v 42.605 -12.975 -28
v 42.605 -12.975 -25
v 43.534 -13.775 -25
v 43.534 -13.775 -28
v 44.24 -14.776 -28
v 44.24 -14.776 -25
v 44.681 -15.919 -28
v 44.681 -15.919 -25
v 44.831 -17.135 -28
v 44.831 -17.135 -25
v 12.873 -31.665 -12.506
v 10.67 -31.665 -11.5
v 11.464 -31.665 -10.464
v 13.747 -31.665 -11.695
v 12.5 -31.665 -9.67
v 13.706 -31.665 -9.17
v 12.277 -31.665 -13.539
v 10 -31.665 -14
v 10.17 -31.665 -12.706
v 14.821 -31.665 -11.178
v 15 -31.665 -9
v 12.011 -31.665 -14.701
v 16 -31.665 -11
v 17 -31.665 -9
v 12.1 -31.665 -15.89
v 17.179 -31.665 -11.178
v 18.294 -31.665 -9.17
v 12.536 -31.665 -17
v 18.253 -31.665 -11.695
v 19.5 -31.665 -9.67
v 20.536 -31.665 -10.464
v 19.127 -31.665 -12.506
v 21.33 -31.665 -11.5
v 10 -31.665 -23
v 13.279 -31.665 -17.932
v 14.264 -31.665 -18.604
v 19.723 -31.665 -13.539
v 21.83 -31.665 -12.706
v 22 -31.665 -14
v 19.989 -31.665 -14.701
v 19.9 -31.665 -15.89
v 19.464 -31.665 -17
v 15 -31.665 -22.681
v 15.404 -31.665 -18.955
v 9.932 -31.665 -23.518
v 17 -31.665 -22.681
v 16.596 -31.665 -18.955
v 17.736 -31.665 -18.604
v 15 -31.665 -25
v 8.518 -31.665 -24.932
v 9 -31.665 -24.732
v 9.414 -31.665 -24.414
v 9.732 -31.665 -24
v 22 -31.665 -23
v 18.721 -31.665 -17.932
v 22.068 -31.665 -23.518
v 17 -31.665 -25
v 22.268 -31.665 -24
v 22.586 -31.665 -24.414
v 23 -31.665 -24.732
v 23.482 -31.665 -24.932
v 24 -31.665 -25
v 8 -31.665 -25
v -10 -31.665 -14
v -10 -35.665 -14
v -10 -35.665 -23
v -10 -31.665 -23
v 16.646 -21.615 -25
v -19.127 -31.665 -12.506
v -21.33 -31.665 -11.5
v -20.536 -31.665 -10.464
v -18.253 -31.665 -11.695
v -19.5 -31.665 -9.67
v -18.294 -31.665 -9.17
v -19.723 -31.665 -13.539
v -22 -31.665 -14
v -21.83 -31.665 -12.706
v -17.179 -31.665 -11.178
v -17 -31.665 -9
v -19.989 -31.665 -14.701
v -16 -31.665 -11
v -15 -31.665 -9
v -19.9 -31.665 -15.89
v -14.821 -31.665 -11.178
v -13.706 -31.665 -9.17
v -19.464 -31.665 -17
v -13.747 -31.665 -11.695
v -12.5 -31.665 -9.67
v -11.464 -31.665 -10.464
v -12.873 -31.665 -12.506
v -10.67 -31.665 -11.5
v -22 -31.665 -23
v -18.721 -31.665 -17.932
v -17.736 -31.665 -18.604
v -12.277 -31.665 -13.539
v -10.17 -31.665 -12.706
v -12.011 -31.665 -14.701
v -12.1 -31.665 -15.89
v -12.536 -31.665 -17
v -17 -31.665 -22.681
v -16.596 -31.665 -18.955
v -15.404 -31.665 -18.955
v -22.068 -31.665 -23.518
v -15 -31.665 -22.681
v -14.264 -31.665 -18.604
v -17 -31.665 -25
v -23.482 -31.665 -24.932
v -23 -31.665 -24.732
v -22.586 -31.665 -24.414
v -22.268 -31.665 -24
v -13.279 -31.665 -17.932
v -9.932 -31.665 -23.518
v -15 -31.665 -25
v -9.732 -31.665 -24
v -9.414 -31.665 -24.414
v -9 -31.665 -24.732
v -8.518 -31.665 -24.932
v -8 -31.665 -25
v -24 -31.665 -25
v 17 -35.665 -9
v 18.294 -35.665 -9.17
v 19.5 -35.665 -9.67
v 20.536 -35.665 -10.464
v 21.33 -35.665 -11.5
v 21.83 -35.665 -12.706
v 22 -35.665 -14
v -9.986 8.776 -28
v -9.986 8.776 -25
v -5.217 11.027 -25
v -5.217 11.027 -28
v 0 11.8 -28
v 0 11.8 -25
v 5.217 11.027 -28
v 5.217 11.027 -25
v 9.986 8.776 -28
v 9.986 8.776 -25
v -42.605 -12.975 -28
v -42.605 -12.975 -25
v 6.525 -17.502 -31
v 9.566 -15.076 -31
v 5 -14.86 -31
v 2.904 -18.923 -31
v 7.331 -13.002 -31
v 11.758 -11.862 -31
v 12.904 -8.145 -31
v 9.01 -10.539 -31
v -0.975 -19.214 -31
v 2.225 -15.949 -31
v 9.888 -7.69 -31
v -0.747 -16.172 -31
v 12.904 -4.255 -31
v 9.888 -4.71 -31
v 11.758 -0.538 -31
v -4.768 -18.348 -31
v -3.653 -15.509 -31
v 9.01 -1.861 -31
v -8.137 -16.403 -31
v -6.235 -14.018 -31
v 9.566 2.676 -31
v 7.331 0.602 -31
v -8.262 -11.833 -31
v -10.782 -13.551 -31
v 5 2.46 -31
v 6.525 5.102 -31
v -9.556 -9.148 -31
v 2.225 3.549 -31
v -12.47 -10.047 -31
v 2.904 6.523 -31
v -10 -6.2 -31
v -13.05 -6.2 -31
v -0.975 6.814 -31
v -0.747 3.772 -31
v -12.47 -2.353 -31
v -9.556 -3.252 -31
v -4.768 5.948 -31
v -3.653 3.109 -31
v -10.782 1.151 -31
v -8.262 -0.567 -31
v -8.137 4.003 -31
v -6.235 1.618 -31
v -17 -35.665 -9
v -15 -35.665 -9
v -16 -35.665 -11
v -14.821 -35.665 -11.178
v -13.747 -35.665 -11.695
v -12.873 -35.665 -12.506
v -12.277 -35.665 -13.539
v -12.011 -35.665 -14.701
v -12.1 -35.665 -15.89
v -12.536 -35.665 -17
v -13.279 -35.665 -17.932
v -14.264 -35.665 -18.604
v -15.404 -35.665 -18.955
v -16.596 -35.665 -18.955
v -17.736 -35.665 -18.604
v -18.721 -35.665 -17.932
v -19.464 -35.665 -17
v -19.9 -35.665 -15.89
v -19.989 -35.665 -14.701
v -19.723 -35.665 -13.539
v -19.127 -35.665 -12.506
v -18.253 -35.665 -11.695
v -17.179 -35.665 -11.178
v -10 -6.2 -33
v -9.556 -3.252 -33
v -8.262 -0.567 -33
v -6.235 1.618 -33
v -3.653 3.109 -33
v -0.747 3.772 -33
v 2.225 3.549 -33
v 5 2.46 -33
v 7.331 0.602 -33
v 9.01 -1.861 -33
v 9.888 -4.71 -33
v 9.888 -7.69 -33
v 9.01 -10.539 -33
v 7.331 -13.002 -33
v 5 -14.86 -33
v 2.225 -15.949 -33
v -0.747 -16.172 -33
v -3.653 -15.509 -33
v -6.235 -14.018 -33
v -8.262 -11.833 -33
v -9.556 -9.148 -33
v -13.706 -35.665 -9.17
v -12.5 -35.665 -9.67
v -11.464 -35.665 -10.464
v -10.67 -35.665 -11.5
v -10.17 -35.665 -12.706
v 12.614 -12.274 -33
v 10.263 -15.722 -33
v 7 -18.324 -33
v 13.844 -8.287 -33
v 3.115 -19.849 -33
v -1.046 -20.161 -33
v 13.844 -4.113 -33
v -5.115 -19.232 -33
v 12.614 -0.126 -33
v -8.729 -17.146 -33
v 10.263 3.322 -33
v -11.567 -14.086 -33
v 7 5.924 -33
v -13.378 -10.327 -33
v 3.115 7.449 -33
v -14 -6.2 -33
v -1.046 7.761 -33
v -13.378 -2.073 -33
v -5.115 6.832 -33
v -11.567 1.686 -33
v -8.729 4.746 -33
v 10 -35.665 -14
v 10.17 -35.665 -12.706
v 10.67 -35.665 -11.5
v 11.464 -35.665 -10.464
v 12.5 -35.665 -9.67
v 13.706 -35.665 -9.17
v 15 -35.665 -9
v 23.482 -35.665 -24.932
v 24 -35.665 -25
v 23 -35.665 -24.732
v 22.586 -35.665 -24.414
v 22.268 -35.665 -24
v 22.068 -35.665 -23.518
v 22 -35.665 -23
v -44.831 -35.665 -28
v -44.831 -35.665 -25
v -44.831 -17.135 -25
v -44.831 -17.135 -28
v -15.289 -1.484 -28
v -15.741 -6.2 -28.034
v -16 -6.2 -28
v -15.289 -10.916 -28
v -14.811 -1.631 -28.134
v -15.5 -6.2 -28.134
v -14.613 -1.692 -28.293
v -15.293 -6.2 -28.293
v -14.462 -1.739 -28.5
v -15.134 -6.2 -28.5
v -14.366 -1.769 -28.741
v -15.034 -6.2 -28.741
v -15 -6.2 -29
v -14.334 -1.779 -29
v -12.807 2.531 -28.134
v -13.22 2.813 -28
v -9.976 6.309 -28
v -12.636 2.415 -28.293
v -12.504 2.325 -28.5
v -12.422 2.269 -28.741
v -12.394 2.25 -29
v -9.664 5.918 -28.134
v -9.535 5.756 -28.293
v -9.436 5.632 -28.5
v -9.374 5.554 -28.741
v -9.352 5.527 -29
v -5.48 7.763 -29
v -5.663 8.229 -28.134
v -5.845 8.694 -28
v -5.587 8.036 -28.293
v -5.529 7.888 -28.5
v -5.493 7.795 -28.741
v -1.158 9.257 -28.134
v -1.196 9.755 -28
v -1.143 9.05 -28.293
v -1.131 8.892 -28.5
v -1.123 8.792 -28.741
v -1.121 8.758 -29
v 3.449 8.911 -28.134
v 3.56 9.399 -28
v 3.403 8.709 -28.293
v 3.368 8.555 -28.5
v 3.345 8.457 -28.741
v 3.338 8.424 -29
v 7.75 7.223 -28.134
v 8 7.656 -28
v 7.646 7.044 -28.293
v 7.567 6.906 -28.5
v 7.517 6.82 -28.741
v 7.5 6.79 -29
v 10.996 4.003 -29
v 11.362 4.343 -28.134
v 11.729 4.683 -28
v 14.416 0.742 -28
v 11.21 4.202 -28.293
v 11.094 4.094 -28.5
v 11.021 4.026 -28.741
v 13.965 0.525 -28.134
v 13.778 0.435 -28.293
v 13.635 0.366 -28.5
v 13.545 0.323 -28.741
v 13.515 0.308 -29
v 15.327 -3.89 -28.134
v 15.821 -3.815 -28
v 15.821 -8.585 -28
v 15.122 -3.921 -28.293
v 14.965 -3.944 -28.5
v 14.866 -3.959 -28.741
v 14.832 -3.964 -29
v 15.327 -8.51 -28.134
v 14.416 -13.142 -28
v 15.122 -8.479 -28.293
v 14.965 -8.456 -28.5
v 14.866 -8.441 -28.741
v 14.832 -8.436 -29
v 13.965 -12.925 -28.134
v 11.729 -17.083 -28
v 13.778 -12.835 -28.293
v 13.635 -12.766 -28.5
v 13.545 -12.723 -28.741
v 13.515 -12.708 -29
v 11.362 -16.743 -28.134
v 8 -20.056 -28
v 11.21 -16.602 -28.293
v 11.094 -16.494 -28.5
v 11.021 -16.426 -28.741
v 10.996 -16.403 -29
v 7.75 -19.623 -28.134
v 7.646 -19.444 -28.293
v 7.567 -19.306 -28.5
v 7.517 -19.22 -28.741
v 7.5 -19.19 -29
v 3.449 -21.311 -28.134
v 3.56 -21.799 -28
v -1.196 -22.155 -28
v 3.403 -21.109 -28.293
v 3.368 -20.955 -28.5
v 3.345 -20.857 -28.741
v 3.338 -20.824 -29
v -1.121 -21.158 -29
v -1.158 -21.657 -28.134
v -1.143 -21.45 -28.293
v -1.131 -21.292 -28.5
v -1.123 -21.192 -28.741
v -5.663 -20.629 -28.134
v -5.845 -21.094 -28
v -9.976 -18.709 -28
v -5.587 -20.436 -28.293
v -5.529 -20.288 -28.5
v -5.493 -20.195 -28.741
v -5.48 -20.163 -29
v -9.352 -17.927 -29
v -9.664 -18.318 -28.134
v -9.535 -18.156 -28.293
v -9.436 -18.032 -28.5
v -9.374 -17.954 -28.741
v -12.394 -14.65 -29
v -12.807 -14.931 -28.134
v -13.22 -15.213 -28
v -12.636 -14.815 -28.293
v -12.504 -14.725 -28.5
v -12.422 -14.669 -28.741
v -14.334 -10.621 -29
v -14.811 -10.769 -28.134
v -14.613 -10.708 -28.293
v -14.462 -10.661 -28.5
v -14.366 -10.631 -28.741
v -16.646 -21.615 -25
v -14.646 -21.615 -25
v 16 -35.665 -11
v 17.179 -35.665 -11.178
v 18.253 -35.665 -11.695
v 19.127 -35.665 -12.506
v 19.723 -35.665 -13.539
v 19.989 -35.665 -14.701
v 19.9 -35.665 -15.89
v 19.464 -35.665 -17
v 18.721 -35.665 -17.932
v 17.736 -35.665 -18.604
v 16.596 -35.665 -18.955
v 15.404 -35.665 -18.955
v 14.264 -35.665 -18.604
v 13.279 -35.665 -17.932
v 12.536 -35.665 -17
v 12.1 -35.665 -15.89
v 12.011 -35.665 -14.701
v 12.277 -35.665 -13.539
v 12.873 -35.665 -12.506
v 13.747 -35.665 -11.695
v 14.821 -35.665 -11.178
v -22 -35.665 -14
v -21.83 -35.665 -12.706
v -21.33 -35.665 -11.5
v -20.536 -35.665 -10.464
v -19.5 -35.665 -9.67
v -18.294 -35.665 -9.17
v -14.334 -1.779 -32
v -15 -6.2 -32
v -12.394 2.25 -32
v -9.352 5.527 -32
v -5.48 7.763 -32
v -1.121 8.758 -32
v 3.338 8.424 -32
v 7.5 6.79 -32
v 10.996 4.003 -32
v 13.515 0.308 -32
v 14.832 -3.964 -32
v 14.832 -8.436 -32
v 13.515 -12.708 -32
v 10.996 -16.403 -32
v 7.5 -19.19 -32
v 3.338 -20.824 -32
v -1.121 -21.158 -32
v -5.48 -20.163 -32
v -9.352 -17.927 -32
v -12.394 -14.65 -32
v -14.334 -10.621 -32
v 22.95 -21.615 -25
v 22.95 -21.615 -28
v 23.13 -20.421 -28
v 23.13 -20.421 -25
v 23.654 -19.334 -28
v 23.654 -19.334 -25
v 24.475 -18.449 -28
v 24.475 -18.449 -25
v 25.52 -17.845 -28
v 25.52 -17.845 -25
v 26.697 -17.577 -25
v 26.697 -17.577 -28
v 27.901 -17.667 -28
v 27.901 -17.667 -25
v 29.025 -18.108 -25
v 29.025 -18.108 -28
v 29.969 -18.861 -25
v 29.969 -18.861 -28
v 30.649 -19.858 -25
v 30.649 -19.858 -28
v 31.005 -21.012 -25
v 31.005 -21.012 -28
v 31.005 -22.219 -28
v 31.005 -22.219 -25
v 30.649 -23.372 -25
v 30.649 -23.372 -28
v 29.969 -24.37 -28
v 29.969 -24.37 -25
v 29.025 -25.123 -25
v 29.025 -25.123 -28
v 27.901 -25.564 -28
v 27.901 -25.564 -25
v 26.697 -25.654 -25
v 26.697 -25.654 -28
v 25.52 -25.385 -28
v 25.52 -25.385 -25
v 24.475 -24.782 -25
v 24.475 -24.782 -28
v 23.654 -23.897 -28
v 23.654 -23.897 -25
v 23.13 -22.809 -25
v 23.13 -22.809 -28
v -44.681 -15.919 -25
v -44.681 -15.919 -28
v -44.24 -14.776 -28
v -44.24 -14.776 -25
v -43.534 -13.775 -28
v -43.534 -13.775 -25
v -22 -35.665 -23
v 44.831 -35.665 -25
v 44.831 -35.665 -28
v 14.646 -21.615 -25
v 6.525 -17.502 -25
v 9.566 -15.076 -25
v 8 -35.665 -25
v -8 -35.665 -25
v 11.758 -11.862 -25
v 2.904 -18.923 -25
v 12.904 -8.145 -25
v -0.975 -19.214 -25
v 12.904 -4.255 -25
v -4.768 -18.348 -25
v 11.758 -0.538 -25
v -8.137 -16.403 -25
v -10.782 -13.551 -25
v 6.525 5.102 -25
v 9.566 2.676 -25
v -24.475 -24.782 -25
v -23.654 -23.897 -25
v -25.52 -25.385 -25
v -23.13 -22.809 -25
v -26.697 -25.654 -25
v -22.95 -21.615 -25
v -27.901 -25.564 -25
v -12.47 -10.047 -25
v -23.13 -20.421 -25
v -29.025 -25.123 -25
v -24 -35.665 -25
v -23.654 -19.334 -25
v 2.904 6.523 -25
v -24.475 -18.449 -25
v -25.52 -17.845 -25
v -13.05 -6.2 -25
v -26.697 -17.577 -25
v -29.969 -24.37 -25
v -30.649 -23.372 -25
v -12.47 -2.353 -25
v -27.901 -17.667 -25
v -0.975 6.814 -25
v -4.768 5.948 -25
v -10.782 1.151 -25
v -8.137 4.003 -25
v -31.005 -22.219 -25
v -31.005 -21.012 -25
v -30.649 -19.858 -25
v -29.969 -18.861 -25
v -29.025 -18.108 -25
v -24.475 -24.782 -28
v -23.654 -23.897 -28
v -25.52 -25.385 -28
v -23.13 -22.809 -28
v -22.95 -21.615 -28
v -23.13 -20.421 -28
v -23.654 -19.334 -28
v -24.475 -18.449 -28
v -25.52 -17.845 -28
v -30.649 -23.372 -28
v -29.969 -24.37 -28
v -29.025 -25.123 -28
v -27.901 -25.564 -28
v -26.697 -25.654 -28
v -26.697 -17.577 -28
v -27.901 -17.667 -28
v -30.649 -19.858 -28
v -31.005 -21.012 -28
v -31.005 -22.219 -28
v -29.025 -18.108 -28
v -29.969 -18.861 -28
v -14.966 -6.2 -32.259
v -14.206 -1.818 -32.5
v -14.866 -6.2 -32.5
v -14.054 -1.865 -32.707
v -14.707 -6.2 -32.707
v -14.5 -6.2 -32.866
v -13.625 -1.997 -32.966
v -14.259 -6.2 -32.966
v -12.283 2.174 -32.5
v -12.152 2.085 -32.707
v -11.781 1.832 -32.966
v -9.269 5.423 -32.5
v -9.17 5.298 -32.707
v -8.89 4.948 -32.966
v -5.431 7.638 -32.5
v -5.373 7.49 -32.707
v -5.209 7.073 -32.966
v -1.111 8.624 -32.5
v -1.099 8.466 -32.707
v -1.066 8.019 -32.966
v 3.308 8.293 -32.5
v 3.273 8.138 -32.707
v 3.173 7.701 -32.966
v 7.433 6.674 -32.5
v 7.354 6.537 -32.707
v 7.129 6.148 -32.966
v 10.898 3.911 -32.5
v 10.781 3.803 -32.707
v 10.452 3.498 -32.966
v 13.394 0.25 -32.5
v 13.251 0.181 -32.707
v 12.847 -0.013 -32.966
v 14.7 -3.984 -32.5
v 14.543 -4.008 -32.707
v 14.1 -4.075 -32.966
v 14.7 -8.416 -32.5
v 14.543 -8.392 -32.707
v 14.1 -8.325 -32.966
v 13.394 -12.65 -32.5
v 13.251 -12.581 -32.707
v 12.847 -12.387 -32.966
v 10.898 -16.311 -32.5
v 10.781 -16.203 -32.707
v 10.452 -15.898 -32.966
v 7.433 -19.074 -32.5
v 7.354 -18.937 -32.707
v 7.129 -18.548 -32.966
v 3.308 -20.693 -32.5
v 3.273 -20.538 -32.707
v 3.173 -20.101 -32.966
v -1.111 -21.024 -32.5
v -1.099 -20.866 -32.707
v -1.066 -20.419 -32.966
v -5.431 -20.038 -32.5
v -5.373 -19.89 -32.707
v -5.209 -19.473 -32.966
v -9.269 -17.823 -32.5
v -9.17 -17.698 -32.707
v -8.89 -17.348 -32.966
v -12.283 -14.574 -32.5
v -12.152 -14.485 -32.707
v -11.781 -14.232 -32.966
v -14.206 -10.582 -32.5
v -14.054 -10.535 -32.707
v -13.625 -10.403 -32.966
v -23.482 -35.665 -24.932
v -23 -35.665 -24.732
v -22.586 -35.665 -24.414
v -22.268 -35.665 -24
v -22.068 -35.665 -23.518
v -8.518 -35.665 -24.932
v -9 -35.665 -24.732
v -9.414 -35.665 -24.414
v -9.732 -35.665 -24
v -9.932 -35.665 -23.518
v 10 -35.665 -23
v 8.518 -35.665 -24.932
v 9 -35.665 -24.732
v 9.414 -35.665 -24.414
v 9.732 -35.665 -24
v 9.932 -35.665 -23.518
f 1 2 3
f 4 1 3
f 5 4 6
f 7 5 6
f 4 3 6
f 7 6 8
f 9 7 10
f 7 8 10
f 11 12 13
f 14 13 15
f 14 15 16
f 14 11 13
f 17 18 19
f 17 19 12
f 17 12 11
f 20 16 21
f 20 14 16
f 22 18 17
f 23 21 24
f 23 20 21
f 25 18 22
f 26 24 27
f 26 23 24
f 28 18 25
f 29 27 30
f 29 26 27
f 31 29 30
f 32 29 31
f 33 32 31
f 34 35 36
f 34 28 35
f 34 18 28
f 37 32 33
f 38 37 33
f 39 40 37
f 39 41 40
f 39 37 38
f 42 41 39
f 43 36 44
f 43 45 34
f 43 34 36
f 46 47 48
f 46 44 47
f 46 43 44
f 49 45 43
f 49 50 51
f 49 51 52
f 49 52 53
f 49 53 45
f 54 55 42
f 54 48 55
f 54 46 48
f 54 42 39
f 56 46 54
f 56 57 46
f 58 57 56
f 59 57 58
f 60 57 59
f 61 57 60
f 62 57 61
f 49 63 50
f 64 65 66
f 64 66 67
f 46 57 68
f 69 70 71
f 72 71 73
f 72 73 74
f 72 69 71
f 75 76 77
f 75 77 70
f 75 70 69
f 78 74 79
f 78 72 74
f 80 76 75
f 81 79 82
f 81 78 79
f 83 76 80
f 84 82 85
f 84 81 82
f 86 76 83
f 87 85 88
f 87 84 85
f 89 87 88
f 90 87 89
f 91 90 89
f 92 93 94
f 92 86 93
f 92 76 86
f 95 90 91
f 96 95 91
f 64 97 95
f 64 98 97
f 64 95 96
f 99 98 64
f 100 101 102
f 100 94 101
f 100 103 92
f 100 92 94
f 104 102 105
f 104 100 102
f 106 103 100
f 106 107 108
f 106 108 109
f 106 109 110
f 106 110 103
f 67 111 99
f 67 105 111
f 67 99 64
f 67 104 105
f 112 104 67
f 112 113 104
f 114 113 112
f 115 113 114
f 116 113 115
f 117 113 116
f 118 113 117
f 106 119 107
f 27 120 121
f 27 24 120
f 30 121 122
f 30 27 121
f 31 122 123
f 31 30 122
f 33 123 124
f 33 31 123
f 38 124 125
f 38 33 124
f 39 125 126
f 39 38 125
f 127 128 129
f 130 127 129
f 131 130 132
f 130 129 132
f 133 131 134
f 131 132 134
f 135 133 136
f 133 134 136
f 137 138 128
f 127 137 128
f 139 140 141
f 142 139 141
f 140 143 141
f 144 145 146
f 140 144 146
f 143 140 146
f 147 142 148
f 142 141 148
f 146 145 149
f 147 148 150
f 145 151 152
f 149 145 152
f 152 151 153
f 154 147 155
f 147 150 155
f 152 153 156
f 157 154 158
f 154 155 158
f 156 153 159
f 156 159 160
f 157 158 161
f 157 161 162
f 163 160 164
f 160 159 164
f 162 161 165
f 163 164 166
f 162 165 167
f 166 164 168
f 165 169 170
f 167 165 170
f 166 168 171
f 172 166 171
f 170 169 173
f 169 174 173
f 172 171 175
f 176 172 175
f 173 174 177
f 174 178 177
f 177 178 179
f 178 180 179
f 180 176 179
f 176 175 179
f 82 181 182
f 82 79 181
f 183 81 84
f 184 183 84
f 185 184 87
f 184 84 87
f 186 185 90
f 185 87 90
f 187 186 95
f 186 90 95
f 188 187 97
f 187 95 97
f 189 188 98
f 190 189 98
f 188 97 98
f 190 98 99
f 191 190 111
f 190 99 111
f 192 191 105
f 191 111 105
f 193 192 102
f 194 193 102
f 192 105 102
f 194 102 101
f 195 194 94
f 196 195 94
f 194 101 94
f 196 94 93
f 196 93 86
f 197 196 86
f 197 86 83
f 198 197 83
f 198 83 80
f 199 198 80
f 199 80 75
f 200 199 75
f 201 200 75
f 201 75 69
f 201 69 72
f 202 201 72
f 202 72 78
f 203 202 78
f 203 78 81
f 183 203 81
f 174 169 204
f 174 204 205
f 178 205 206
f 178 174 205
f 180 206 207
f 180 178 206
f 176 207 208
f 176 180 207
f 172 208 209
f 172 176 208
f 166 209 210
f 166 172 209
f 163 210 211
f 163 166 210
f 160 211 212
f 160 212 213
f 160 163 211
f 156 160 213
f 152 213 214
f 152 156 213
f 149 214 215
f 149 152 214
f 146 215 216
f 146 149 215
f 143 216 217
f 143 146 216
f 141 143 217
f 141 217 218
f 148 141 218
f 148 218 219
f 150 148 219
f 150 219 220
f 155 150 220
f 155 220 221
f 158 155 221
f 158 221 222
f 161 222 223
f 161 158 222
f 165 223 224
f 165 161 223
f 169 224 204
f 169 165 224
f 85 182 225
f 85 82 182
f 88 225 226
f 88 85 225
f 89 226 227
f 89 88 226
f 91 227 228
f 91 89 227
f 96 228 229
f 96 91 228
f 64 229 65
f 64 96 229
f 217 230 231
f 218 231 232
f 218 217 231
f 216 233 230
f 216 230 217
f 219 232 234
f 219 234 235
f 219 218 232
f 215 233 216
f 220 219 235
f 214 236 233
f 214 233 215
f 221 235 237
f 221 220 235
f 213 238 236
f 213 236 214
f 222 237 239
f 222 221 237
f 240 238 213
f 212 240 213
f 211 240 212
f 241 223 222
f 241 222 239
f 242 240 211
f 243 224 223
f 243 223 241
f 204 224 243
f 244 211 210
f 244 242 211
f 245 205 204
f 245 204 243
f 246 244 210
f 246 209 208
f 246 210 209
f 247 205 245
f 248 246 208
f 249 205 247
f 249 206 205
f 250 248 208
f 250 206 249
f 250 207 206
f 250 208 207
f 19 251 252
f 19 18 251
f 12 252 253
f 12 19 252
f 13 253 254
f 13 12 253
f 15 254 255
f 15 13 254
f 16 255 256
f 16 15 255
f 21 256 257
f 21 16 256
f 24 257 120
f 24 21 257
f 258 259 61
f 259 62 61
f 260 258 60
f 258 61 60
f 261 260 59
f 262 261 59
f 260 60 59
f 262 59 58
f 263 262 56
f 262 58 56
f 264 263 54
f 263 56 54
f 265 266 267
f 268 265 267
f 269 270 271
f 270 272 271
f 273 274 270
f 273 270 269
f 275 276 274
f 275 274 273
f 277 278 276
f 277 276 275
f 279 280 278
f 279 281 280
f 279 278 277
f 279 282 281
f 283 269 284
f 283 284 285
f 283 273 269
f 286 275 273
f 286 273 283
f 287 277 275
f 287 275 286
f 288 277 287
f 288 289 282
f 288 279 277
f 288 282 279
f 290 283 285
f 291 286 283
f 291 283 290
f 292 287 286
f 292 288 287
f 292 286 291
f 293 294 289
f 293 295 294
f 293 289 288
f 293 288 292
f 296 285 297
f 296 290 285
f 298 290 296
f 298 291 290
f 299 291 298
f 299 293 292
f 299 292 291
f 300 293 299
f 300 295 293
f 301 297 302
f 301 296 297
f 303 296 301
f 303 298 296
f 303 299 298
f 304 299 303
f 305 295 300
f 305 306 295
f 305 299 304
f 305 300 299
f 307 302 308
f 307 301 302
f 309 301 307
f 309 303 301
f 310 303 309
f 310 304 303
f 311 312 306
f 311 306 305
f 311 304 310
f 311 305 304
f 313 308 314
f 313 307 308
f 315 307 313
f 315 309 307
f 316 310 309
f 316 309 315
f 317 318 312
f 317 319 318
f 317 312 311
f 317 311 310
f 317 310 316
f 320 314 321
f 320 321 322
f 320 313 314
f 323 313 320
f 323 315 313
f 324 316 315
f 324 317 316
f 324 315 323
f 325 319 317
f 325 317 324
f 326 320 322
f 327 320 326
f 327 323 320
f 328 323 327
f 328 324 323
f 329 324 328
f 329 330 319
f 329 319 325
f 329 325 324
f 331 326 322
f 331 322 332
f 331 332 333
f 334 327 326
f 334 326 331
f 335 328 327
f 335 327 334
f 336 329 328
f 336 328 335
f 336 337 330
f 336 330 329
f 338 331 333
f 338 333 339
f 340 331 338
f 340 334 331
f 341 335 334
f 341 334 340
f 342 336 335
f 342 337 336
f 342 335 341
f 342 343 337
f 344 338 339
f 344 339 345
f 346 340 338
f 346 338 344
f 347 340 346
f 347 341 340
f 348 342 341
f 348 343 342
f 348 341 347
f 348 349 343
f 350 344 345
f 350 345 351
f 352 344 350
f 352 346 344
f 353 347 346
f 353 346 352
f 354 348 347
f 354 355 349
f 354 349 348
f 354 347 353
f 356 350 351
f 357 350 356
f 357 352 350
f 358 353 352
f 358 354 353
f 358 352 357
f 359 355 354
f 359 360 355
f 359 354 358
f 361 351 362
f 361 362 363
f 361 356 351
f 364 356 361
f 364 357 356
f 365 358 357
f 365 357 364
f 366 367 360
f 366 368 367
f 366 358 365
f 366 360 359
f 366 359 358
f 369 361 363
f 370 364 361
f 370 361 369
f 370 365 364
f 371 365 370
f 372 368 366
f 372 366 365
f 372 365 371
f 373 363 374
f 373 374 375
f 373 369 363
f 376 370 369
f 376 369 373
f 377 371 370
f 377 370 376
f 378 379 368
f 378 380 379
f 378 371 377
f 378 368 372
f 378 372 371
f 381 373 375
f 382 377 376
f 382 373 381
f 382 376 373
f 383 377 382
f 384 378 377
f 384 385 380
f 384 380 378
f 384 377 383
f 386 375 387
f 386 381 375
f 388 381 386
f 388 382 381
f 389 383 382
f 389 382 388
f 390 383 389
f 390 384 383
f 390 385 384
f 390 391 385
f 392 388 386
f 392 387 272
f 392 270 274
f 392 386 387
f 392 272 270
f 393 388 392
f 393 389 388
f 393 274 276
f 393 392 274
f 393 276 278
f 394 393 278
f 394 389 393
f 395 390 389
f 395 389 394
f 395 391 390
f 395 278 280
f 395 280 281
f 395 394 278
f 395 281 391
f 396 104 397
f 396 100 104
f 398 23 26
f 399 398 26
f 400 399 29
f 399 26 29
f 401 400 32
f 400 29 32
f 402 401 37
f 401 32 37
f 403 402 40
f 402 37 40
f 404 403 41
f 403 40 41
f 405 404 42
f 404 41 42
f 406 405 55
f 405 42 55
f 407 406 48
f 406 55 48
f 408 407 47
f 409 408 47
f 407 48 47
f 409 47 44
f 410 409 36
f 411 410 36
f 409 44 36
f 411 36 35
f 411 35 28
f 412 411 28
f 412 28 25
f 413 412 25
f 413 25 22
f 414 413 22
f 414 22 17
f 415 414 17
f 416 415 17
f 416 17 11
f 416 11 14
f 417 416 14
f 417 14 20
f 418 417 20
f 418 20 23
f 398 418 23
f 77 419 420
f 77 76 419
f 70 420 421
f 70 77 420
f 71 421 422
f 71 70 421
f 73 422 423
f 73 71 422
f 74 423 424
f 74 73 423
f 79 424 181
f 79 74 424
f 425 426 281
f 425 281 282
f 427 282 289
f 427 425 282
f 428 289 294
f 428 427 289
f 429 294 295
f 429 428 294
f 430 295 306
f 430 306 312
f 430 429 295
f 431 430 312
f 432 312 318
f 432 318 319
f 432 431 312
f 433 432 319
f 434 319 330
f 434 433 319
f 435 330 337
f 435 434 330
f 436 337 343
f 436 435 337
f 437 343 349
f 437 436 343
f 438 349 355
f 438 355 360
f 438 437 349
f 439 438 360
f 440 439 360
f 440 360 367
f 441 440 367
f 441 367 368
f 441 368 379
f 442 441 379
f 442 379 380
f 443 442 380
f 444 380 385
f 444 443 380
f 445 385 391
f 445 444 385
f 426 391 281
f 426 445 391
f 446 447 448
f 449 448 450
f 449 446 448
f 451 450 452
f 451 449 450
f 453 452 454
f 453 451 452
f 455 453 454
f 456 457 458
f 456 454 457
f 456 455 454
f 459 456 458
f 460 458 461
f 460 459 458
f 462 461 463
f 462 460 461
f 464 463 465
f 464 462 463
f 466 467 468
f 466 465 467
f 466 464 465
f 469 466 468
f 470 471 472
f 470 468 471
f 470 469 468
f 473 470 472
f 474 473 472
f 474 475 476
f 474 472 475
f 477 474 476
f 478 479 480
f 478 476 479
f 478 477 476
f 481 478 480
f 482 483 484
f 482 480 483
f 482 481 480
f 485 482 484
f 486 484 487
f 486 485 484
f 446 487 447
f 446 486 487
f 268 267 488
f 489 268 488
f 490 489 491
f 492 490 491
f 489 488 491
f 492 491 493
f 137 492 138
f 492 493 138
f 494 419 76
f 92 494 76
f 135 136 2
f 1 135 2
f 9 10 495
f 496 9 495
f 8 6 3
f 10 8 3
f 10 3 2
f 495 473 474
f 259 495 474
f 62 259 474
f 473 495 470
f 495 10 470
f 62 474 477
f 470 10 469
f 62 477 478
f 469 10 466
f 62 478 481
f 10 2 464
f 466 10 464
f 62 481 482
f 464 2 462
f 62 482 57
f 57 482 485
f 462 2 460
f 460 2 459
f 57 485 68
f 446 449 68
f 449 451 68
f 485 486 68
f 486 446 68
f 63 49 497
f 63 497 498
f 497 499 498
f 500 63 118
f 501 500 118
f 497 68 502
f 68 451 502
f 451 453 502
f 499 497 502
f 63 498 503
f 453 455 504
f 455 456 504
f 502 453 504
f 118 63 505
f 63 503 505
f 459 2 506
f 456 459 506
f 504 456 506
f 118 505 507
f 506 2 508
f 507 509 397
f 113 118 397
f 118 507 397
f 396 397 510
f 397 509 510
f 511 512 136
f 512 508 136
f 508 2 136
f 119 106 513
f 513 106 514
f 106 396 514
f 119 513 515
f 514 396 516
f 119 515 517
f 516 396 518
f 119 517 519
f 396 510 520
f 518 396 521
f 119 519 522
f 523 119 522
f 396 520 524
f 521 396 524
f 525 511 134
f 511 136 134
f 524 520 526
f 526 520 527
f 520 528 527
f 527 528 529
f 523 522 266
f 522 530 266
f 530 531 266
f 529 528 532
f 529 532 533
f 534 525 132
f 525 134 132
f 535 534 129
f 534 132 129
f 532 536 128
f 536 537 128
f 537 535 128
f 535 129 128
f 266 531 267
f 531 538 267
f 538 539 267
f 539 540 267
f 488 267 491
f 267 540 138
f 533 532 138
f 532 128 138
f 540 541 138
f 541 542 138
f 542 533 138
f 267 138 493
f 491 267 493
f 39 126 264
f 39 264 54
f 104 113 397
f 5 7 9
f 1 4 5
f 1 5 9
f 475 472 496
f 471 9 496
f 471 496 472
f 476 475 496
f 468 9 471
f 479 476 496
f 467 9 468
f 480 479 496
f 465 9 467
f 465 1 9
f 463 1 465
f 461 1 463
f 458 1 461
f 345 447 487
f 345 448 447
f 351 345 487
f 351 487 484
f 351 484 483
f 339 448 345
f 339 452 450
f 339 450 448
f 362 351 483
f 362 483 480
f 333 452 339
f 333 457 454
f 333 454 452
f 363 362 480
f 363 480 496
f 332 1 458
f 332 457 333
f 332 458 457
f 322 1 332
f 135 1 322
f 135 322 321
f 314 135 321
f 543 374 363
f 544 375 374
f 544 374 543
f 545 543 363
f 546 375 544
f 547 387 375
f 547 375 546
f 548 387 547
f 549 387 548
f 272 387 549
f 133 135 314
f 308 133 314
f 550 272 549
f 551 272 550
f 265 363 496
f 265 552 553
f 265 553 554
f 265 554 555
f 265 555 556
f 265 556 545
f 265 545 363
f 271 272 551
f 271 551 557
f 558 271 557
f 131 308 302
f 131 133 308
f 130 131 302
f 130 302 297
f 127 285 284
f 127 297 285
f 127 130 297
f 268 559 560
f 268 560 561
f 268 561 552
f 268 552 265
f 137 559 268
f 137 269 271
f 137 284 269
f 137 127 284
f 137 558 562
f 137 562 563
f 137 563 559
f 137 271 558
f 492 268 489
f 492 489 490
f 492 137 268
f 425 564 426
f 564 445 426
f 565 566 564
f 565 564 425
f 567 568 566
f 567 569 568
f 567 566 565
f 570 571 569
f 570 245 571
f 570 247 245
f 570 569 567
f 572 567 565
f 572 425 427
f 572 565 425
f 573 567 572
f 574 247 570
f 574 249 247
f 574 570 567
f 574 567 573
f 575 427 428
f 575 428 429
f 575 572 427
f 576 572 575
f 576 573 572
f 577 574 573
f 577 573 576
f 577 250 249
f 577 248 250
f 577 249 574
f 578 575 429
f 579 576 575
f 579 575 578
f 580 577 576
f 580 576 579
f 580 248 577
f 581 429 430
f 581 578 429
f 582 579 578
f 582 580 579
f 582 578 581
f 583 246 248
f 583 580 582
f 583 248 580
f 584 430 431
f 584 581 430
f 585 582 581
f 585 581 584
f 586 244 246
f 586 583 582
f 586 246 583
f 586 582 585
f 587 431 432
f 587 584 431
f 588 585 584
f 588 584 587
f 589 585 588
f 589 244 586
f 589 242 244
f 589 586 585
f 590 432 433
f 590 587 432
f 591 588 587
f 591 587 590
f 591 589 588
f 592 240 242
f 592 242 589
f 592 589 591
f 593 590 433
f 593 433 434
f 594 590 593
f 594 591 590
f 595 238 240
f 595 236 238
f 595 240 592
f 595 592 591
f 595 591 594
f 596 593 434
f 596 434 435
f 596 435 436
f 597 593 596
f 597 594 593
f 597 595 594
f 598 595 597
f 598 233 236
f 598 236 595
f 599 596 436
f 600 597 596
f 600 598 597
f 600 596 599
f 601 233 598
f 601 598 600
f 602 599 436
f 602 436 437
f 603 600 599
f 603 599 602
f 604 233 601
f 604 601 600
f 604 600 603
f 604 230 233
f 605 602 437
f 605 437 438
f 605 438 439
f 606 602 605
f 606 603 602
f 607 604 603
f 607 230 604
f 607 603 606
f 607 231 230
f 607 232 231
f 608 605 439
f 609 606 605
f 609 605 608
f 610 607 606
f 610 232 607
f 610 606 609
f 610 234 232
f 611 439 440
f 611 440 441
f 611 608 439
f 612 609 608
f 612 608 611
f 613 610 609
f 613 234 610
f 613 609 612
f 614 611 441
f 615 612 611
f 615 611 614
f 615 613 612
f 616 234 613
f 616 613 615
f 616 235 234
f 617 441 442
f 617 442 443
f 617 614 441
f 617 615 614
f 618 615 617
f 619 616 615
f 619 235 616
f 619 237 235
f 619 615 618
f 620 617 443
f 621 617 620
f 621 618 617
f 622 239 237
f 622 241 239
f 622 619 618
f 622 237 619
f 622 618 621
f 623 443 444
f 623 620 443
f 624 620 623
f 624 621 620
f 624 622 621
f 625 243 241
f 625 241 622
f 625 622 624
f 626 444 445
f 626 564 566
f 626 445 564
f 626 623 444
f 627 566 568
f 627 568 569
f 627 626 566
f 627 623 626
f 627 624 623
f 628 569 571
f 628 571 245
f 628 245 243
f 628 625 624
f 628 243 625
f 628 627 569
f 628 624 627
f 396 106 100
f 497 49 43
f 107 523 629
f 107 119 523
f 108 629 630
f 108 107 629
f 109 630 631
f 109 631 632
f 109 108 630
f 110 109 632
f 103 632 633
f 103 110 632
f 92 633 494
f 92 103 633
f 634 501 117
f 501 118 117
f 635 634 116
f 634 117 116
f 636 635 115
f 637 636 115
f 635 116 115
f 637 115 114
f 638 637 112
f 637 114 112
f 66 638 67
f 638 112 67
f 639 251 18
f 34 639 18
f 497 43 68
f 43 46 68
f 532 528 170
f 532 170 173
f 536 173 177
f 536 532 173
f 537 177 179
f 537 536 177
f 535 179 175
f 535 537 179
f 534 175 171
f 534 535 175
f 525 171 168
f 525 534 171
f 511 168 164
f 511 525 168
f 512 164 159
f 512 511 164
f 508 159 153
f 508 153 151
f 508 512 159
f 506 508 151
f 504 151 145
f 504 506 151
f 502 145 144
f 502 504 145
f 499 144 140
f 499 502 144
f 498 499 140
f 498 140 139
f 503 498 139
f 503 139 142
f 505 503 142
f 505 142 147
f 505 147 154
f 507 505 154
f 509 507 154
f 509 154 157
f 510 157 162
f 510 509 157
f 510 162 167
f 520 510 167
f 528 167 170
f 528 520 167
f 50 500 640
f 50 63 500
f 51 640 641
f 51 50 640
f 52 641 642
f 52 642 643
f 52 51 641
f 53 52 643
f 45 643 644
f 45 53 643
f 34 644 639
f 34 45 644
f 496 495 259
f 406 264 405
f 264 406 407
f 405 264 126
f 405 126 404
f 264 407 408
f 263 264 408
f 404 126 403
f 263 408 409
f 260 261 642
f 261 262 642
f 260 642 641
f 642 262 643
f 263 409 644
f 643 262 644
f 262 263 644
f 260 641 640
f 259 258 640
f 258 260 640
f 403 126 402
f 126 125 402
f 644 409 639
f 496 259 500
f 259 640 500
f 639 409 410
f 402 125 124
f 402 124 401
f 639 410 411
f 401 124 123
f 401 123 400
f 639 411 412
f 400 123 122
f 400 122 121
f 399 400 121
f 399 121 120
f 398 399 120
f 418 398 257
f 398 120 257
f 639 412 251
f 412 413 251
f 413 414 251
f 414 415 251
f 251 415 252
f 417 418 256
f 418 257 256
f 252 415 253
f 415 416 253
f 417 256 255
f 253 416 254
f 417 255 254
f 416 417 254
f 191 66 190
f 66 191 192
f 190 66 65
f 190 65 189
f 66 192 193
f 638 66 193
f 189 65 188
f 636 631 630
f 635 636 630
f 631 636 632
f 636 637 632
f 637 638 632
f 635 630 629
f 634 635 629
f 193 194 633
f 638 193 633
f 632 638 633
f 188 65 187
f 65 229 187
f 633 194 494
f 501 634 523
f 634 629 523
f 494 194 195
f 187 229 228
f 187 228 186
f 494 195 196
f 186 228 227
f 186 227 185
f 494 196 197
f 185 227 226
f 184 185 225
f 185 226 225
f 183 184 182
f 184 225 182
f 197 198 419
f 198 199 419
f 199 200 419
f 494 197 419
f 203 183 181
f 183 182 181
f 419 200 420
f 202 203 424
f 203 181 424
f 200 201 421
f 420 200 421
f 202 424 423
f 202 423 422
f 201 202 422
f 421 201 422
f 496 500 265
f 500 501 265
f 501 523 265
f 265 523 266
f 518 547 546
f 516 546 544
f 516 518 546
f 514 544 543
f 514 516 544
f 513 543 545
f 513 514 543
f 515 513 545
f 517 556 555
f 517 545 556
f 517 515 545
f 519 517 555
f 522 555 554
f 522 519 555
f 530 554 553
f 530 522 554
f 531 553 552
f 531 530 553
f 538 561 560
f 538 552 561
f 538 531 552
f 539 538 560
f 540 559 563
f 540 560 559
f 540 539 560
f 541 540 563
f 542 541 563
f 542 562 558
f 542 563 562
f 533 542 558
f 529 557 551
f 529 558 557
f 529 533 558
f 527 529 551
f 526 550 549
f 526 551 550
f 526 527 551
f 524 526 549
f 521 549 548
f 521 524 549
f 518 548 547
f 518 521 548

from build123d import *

# Parameters (mm, degrees)
SALIENTE_EXTRUIR1_DEPTH = 23
SALIENTE_EXTRUIR2_DEPTH = 2
CROQUIS3_W              = 74.8935
CROQUIS3_H              = 50
SALIENTE_EXTRUIR3_DEPTH = 2
CROQUIS4_R              = 4.05
SALIENTE_EXTRUIR4_DEPTH = 50
CHAFL_N2_SIZE           = 1
CROQUIS7_R              = 4.05
CROQUIS7_R_2            = 13.05
SALIENTE_EXTRUIR5_DEPTH = 6
CROQUIS8_W              = 12
CROQUIS8_H              = 4
SALIENTE_EXTRUIR6_DEPTH = 16
REDONDEO3_R             = 2
REDONDEO4_R             = 5
CROQUIS14_R             = 4
CORTAR_EXTRUIR1_DEPTH   = 10
SALIENTE_EXTRUIR7_DEPTH = 1
CROQUIS20_R             = 4.05
CROQUIS20_R_2           = 10
SALIENTE_EXTRUIR8_DEPTH = 2
CHAFL_N3_SIZE           = 1
CROQUIS22_R             = 5.05
CROQUIS22_R_2           = 15
CORTAR_EXTRUIR3_DEPTH   = 5
REDONDEO6_R             = 1


with BuildPart() as part:
    # Croquis1 → Saliente-Extruir1 (new, symmetric)
    with BuildSketch(Plane.XY):
        Polygon((-7.48935, 0), (7.48935, 0), (0.00065, 21.6199), align=None)
    extrude(amount=SALIENTE_EXTRUIR1_DEPTH, both=True)

    # Croquis2 → Saliente-Extruir2 (add)
    with BuildSketch(Plane.XY.offset(23)):
        Polygon((37.44675, 0), (-37.44675, 0), (0.00065, 21.6199), align=None)
    saliente_extruir2 = extrude(amount=SALIENTE_EXTRUIR2_DEPTH)

    # Simetría1: Saliente-Extruir2 across plane
    add(saliente_extruir2.mirror(Plane.XY))

    # Croquis3 → Saliente-Extruir3 (add)
    with BuildSketch(Plane.XZ):
        Rectangle(CROQUIS3_W, CROQUIS3_H)
    extrude(amount=SALIENTE_EXTRUIR3_DEPTH)

    # Croquis4 → Saliente-Extruir4 (add)
    with BuildSketch(Plane.XY.offset(25)):
        with BuildLine():
            Line((7.743545699, -2), (-7.743545699, -2))
            ThreePointArc((-7.743545699, -2), (-6.147743753, -2.794422898), (-5.819683414, -4.546583851))
            ThreePointArc((-5.819683414, -4.546583851), (0, -12.25), (5.819683414, -4.546583851))
            ThreePointArc((5.819683414, -4.546583851), (6.147743753, -2.794422898), (7.743545699, -2))
        make_face()
        with Locations((0, -6.2)):
            Circle(CROQUIS4_R, mode=Mode.SUBTRACT)
    extrude(amount=-SALIENTE_EXTRUIR4_DEPTH)

    # Chaflán2
    chafl_n2_edges = [part.edges().sort_by_distance(p)[0] for p in [
        (-4.05, -6.2, -25),
        (-4.05, -6.2, 25),
    ]]
    chamfer(chafl_n2_edges, length=CHAFL_N2_SIZE)


with BuildPart() as body_2:
    # Croquis7 → Saliente-Extruir5 (new body)
    with BuildSketch(Plane(origin=(0, 0, -25), x_dir=(-1, 0, 0), z_dir=(0, 0, -1))):
        with BuildLine():
            Line((-9.986152883, 8.775872282), (-42.60542858, -12.975186214))
            ThreePointArc((-42.60542858, -12.975186214), (-44.239992249, -14.776089142), (-44.831497223, -17.135150737))
            Line((-44.831497223, -17.135150737), (-44.831497223, -35.665252187))
            Line((-44.831497223, -35.665252187), (44.831497223, -35.665252187))
            Line((44.831497223, -35.665252187), (44.831497223, -17.135150737))
            ThreePointArc((44.831497223, -17.135150737), (44.239992249, -14.776089142), (42.60542858, -12.975186214))
            Line((42.60542858, -12.975186214), (9.986152883, 8.775872282))
            ThreePointArc((9.986152883, 8.775872282), (0, 11.8), (-9.986152883, 8.775872282))
        make_face()
        with Locations((-27, -21.615252187)):
            Circle(CROQUIS7_R, mode=Mode.SUBTRACT)
        with Locations(Location((27, -21.615252187, 0), (0, 0, 180))):
            Circle(CROQUIS7_R, mode=Mode.SUBTRACT)
        with Locations((0, -6.2)):
            Circle(CROQUIS7_R_2, mode=Mode.SUBTRACT)
    extrude(amount=SALIENTE_EXTRUIR5_DEPTH)

    # Croquis8 → Saliente-Extruir6 (add)
    with BuildSketch(Plane.XY.offset(-25)):
        with Locations((-16, -33.665252187)):
            Rectangle(CROQUIS8_W, CROQUIS8_H)
        with Locations((16, -33.665252187)):
            Rectangle(CROQUIS8_W, CROQUIS8_H)
    extrude(amount=SALIENTE_EXTRUIR6_DEPTH)

    # Redondeo3
    redondeo3_edges = [body_2.edges().sort_by_distance(p)[0] for p in [
        (-22, -33.665252187, -25),
        (-10, -33.665252187, -25),
        (22, -33.665252187, -25),
        (10, -33.665252187, -25),
    ]]
    fillet(redondeo3_edges, radius=REDONDEO3_R)

    # Redondeo4
    redondeo4_edges = [body_2.edges().sort_by_distance(p)[0] for p in [
        (-22, -33.665252187, -9),
        (-10, -33.665252187, -9),
        (22, -33.665252187, -9),
        (10, -33.665252187, -9),
    ]]
    fillet(redondeo4_edges, radius=REDONDEO4_R)

    # Croquis14 → Cortar-Extruir1 (cut)
    with BuildSketch(Plane(origin=(0, -31.665252187, 0), x_dir=(1, 0, 0), z_dir=(0, 1, 0))):
        with Locations(Location((-16, 15, 0), (0, 0, 270))):
            Circle(CROQUIS14_R)
        with Locations(Location((16, 15, 0), (0, 0, 270))):
            Circle(CROQUIS14_R)
    extrude(amount=-CORTAR_EXTRUIR1_DEPTH, mode=Mode.SUBTRACT)

    # Croquis3D2 → Saliente-Extruir7 (add, symmetric, along a direction that is not the sketch's normal)
    with BuildSketch(Plane(origin=(-16, -31.665252187, -22.681195735), x_dir=(0.03434705256799914, 0.973825325774171, -0.22468759391813525), z_dir=(-0.9993785848148502, 0.035248322136908906, 0))):
        Polygon((0, 0), (10.320125934, 0), (0.521006551, 2.259514415), align=None)
    saliente_extruir7 = extrude(amount=SALIENTE_EXTRUIR7_DEPTH, dir=(-1, 0, 0), both=True)

    # Simetría2: Saliente-Extruir7 across plane
    add(saliente_extruir7.mirror(Plane(origin=(0, 0, 0), x_dir=(0, 0, 1), z_dir=(1, 0, 0))))

    # Croquis20 → Saliente-Extruir8 (add)
    with BuildSketch(Plane(origin=(0, 0, -31), x_dir=(-1, 0, 0), z_dir=(0, 0, -1))):
        with BuildLine():
            Line((42.60542858, -12.975186214), (9.986152883, 8.775872282))
            ThreePointArc((9.986152883, 8.775872282), (0, 11.8), (-9.986152883, 8.775872282))
            Line((-9.986152883, 8.775872282), (-42.60542858, -12.975186214))
            ThreePointArc((-42.60542858, -12.975186214), (-44.239992249, -14.776089142), (-44.831497223, -17.135150737))
            Line((-44.831497223, -17.135150737), (-44.831497223, -35.665252187))
            Line((-44.831497223, -35.665252187), (44.831497223, -35.665252187))
            Line((44.831497223, -35.665252187), (44.831497223, -17.135150737))
            ThreePointArc((44.831497223, -17.135150737), (44.239992249, -14.776089142), (42.60542858, -12.975186214))
        make_face()
        with Locations((-27, -21.615252187)):
            Circle(CROQUIS20_R, mode=Mode.SUBTRACT)
        with Locations(Location((27, -21.615252187, 0), (0, 0, 180))):
            Circle(CROQUIS20_R, mode=Mode.SUBTRACT)
        with Locations((0, -6.2)):
            Circle(CROQUIS20_R_2, mode=Mode.SUBTRACT)
    extrude(amount=SALIENTE_EXTRUIR8_DEPTH)

    # Chaflán3
    chafl_n3_edges = [body_2.edges().sort_by_distance(p)[0] for p in [
        (31.05, -21.615252187, -33),
        (-31.05, -21.615252187, -33),
    ]]
    chamfer(chafl_n3_edges, length=CHAFL_N3_SIZE)

    # Croquis22 → Cortar-Extruir3 (cut)
    # profile 1 of 3: a face of its own
    with BuildSketch(Plane(origin=(0, 0, -33), x_dir=(-1, 0, 0), z_dir=(0, 0, -1))):
        with BuildLine():
            ThreePointArc((44.831497223, -17.135150737), (44.239992249, -14.776089142), (42.60542858, -12.975186214))
            Line((42.60542858, -12.975186214), (9.986152883, 8.775872282))
            ThreePointArc((9.986152883, 8.775872282), (0, 11.8), (-9.986152883, 8.775872282))
            Line((-9.986152883, 8.775872282), (-42.60542858, -12.975186214))
            ThreePointArc((-42.60542858, -12.975186214), (-44.239992249, -14.776089142), (-44.831497223, -17.135150737))
            Line((-44.831497223, -17.135150737), (-44.831497223, -35.665252187))
            Line((-44.831497223, -35.665252187), (44.831497223, -35.665252187))
            Line((44.831497223, -35.665252187), (44.831497223, -17.135150737))
        make_face()
        with Locations((-27, -21.615252187)):
            Circle(CROQUIS22_R, mode=Mode.SUBTRACT)
        with Locations((27, -21.615252187)):
            Circle(CROQUIS22_R, mode=Mode.SUBTRACT)
        with Locations((0, -6.2)):
            Circle(CROQUIS22_R_2, mode=Mode.SUBTRACT)
    # profile 2 of 3: a face of its own
    with BuildSketch(Plane(origin=(0, 0, -33), x_dir=(-1, 0, 0), z_dir=(0, 0, -1))):
        with Locations((-27, -21.615252187)):
            Circle(CROQUIS22_R)
    # profile 3 of 3: a face of its own
    with BuildSketch(Plane(origin=(0, 0, -33), x_dir=(-1, 0, 0), z_dir=(0, 0, -1))):
        with Locations((27, -21.615252187)):
            Circle(CROQUIS22_R)
    extrude(amount=-CORTAR_EXTRUIR3_DEPTH, mode=Mode.SUBTRACT)

    # Redondeo6
    redondeo6_edges = [body_2.edges().sort_by_distance(p)[0] for p in [
        (15, -6.2, -33),
        (15, -6.2, -28),
    ]]
    fillet(redondeo6_edges, radius=REDONDEO6_R)


solid = body_2.part
